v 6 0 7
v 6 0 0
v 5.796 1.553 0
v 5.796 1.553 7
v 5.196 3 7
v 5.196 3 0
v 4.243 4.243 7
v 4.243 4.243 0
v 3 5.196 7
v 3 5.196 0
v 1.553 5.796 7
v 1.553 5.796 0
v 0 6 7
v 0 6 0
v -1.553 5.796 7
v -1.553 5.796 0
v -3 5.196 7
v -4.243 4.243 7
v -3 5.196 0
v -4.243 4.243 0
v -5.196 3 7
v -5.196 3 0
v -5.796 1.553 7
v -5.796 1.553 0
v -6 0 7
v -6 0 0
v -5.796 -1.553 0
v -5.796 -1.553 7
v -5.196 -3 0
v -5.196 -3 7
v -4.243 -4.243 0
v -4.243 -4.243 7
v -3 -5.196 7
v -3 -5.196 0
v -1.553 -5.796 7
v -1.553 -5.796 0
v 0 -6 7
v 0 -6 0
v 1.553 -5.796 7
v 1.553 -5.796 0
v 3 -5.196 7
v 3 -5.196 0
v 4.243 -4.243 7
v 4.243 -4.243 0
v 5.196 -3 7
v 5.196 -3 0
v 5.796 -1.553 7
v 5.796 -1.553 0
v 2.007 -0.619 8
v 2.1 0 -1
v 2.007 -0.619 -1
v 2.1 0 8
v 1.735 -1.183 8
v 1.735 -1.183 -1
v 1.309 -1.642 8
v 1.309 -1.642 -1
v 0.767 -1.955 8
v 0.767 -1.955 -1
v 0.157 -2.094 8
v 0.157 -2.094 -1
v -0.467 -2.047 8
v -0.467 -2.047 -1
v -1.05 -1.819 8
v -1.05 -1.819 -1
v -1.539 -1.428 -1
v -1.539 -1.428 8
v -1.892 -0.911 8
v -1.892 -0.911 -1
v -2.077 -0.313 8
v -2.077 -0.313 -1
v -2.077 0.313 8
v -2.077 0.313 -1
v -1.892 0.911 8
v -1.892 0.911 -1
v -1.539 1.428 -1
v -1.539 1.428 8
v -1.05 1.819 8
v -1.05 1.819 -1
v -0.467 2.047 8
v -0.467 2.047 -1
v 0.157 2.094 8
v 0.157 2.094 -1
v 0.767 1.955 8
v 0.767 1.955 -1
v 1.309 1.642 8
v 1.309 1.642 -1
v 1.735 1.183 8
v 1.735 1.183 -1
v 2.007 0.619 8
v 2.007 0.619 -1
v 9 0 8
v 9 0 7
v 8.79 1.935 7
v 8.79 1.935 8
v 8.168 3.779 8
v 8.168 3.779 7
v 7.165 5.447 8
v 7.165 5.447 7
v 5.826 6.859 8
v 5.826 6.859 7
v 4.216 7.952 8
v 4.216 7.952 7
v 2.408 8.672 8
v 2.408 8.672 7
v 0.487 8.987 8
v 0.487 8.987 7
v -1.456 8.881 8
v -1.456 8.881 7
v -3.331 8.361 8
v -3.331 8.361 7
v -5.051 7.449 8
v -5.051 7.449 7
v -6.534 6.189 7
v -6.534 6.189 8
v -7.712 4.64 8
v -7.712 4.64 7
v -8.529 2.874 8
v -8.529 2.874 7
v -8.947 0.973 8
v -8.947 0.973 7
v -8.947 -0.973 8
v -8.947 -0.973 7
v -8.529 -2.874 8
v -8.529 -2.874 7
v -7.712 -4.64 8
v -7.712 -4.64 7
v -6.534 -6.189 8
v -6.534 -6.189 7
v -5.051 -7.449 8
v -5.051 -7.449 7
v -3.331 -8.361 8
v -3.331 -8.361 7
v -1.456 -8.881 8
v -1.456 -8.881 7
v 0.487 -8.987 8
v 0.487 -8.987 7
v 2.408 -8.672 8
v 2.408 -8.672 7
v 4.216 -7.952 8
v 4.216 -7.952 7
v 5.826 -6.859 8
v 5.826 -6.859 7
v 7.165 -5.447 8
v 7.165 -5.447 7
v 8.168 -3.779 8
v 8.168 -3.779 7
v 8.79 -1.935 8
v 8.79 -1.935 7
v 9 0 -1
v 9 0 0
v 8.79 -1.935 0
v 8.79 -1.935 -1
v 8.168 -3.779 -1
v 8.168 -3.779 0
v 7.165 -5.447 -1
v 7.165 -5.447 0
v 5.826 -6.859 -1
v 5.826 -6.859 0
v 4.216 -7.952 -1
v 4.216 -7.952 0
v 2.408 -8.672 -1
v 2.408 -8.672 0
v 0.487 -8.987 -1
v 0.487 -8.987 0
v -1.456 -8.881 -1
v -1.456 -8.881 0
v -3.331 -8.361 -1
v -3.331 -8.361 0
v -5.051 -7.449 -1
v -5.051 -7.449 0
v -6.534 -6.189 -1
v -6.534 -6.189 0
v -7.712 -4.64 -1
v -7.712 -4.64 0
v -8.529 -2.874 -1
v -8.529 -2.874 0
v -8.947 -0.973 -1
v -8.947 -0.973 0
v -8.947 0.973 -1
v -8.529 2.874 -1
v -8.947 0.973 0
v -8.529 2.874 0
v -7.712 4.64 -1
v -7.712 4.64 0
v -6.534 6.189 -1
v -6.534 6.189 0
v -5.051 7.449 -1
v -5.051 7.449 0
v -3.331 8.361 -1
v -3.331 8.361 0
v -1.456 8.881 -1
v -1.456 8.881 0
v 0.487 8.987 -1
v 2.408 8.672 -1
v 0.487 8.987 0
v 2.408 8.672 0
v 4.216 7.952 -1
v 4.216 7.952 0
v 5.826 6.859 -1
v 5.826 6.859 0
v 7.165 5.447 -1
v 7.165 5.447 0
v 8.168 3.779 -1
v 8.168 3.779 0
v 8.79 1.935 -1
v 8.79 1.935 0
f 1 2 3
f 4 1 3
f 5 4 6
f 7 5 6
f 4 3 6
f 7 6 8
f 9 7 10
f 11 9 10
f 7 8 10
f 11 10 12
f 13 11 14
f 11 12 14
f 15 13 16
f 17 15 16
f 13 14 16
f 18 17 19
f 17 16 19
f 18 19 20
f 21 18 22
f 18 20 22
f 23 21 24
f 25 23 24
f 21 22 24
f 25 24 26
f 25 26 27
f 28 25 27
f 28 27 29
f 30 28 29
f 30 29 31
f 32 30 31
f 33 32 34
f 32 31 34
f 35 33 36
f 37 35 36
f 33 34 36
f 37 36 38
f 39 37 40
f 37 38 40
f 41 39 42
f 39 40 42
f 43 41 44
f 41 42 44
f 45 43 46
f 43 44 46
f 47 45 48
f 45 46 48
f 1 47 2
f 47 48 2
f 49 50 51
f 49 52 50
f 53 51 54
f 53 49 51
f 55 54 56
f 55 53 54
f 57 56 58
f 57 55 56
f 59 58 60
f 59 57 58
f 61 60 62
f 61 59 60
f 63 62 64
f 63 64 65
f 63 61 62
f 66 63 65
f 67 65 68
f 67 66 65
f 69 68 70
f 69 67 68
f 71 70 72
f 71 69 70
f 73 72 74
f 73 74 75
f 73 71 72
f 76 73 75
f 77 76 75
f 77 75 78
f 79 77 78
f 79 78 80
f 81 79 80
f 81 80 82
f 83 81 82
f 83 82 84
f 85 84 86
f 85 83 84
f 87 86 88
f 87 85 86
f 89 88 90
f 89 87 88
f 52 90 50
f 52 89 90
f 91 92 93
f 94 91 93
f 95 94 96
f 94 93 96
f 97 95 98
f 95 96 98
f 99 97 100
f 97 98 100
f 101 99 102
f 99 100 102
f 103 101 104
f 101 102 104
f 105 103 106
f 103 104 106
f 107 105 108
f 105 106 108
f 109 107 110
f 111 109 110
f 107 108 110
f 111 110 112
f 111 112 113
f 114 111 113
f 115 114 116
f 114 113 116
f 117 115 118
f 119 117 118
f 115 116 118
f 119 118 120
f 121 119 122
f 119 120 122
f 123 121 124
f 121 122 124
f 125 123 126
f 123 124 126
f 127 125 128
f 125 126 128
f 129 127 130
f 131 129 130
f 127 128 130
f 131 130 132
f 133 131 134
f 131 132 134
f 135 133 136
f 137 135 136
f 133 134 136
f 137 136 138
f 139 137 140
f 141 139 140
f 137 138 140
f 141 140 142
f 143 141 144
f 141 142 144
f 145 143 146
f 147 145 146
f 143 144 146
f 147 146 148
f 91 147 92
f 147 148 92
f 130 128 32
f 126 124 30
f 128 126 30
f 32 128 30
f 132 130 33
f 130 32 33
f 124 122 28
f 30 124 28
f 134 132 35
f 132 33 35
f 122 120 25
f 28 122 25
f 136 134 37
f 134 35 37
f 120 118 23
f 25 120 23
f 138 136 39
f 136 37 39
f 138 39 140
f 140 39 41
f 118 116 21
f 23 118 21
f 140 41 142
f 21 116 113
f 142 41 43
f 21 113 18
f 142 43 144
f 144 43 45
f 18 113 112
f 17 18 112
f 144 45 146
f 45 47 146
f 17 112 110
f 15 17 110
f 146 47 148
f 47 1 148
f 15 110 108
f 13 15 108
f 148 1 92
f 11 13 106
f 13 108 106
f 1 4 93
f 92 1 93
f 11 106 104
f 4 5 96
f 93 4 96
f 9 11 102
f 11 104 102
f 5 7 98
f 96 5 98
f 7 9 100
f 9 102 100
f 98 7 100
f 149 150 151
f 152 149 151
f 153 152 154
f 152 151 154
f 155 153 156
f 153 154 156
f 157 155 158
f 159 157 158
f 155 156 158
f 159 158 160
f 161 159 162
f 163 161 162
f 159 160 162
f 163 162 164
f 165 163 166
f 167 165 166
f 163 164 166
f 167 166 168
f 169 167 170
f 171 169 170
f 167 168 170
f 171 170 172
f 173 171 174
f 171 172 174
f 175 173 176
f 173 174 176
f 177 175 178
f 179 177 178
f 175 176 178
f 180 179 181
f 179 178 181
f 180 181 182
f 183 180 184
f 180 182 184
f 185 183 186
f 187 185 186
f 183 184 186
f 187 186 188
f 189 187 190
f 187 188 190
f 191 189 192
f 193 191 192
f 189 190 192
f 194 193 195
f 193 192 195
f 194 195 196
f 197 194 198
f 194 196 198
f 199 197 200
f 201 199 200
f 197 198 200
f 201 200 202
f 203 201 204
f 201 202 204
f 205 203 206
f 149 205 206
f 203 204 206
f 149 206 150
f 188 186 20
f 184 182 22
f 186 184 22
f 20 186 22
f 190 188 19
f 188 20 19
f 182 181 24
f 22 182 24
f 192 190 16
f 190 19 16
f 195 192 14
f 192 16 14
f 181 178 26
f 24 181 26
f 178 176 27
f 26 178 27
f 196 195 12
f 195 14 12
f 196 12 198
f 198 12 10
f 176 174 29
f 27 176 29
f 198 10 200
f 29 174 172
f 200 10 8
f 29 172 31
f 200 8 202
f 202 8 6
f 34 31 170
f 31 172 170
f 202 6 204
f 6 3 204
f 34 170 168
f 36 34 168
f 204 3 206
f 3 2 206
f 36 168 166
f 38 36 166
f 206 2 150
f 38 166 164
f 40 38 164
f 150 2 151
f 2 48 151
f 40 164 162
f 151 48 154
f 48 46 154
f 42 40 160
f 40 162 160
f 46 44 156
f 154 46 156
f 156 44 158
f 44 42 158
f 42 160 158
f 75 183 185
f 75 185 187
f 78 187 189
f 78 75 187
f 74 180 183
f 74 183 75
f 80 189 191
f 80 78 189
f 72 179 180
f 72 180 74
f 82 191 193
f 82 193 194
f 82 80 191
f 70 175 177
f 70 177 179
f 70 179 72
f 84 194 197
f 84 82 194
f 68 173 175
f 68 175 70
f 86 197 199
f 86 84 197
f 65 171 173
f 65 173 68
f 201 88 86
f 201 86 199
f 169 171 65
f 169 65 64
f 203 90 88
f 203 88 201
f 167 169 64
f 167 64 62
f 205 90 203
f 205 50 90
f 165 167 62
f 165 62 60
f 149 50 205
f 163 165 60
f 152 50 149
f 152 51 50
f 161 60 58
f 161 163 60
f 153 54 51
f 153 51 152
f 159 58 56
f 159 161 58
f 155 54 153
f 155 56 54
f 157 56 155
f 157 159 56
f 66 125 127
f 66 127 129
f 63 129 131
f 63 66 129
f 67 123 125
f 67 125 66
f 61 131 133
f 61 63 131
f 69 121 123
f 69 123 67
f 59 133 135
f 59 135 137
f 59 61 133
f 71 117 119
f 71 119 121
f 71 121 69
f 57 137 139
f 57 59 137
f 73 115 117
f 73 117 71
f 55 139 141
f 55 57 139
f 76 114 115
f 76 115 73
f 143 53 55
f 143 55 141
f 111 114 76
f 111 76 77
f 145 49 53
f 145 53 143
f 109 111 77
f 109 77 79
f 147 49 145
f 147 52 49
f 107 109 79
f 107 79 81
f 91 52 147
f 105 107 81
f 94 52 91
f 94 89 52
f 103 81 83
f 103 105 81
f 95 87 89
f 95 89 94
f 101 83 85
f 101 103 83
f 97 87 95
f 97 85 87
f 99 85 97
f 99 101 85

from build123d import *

# Parameters (mm, degrees)
SKETCH_R      = 6
SKETCH_R_2    = 2.1
PAD_DEPTH     = 7
SKETCH001_R   = 9
SKETCH001_R_2 = 2.1
PAD001_DEPTH  = 1
SKETCH002_R   = 9
SKETCH002_R_2 = 2.1
PAD002_DEPTH  = 1


with BuildPart() as part:
    # Sketch → Pad (new body)
    with BuildSketch(Plane.XY):
        Circle(SKETCH_R)
        Circle(SKETCH_R_2, mode=Mode.SUBTRACT)
    extrude(amount=PAD_DEPTH)

    # Sketch001 (on Face4 of Pad) → Pad001 (join)
    with BuildSketch(Plane.XY.offset(7)):
        Circle(SKETCH001_R)
        Circle(SKETCH001_R_2, mode=Mode.SUBTRACT)
    extrude(amount=PAD001_DEPTH)

    # Sketch002 (on Face2 of Pad001) → Pad002 (join)
    with BuildSketch(Plane(origin=(0, 0, 0), x_dir=(1, 0, 0), z_dir=(0, 0, -1))):
        Circle(SKETCH002_R)
        Circle(SKETCH002_R_2, mode=Mode.SUBTRACT)
    extrude(amount=PAD002_DEPTH)


solid = part.part
